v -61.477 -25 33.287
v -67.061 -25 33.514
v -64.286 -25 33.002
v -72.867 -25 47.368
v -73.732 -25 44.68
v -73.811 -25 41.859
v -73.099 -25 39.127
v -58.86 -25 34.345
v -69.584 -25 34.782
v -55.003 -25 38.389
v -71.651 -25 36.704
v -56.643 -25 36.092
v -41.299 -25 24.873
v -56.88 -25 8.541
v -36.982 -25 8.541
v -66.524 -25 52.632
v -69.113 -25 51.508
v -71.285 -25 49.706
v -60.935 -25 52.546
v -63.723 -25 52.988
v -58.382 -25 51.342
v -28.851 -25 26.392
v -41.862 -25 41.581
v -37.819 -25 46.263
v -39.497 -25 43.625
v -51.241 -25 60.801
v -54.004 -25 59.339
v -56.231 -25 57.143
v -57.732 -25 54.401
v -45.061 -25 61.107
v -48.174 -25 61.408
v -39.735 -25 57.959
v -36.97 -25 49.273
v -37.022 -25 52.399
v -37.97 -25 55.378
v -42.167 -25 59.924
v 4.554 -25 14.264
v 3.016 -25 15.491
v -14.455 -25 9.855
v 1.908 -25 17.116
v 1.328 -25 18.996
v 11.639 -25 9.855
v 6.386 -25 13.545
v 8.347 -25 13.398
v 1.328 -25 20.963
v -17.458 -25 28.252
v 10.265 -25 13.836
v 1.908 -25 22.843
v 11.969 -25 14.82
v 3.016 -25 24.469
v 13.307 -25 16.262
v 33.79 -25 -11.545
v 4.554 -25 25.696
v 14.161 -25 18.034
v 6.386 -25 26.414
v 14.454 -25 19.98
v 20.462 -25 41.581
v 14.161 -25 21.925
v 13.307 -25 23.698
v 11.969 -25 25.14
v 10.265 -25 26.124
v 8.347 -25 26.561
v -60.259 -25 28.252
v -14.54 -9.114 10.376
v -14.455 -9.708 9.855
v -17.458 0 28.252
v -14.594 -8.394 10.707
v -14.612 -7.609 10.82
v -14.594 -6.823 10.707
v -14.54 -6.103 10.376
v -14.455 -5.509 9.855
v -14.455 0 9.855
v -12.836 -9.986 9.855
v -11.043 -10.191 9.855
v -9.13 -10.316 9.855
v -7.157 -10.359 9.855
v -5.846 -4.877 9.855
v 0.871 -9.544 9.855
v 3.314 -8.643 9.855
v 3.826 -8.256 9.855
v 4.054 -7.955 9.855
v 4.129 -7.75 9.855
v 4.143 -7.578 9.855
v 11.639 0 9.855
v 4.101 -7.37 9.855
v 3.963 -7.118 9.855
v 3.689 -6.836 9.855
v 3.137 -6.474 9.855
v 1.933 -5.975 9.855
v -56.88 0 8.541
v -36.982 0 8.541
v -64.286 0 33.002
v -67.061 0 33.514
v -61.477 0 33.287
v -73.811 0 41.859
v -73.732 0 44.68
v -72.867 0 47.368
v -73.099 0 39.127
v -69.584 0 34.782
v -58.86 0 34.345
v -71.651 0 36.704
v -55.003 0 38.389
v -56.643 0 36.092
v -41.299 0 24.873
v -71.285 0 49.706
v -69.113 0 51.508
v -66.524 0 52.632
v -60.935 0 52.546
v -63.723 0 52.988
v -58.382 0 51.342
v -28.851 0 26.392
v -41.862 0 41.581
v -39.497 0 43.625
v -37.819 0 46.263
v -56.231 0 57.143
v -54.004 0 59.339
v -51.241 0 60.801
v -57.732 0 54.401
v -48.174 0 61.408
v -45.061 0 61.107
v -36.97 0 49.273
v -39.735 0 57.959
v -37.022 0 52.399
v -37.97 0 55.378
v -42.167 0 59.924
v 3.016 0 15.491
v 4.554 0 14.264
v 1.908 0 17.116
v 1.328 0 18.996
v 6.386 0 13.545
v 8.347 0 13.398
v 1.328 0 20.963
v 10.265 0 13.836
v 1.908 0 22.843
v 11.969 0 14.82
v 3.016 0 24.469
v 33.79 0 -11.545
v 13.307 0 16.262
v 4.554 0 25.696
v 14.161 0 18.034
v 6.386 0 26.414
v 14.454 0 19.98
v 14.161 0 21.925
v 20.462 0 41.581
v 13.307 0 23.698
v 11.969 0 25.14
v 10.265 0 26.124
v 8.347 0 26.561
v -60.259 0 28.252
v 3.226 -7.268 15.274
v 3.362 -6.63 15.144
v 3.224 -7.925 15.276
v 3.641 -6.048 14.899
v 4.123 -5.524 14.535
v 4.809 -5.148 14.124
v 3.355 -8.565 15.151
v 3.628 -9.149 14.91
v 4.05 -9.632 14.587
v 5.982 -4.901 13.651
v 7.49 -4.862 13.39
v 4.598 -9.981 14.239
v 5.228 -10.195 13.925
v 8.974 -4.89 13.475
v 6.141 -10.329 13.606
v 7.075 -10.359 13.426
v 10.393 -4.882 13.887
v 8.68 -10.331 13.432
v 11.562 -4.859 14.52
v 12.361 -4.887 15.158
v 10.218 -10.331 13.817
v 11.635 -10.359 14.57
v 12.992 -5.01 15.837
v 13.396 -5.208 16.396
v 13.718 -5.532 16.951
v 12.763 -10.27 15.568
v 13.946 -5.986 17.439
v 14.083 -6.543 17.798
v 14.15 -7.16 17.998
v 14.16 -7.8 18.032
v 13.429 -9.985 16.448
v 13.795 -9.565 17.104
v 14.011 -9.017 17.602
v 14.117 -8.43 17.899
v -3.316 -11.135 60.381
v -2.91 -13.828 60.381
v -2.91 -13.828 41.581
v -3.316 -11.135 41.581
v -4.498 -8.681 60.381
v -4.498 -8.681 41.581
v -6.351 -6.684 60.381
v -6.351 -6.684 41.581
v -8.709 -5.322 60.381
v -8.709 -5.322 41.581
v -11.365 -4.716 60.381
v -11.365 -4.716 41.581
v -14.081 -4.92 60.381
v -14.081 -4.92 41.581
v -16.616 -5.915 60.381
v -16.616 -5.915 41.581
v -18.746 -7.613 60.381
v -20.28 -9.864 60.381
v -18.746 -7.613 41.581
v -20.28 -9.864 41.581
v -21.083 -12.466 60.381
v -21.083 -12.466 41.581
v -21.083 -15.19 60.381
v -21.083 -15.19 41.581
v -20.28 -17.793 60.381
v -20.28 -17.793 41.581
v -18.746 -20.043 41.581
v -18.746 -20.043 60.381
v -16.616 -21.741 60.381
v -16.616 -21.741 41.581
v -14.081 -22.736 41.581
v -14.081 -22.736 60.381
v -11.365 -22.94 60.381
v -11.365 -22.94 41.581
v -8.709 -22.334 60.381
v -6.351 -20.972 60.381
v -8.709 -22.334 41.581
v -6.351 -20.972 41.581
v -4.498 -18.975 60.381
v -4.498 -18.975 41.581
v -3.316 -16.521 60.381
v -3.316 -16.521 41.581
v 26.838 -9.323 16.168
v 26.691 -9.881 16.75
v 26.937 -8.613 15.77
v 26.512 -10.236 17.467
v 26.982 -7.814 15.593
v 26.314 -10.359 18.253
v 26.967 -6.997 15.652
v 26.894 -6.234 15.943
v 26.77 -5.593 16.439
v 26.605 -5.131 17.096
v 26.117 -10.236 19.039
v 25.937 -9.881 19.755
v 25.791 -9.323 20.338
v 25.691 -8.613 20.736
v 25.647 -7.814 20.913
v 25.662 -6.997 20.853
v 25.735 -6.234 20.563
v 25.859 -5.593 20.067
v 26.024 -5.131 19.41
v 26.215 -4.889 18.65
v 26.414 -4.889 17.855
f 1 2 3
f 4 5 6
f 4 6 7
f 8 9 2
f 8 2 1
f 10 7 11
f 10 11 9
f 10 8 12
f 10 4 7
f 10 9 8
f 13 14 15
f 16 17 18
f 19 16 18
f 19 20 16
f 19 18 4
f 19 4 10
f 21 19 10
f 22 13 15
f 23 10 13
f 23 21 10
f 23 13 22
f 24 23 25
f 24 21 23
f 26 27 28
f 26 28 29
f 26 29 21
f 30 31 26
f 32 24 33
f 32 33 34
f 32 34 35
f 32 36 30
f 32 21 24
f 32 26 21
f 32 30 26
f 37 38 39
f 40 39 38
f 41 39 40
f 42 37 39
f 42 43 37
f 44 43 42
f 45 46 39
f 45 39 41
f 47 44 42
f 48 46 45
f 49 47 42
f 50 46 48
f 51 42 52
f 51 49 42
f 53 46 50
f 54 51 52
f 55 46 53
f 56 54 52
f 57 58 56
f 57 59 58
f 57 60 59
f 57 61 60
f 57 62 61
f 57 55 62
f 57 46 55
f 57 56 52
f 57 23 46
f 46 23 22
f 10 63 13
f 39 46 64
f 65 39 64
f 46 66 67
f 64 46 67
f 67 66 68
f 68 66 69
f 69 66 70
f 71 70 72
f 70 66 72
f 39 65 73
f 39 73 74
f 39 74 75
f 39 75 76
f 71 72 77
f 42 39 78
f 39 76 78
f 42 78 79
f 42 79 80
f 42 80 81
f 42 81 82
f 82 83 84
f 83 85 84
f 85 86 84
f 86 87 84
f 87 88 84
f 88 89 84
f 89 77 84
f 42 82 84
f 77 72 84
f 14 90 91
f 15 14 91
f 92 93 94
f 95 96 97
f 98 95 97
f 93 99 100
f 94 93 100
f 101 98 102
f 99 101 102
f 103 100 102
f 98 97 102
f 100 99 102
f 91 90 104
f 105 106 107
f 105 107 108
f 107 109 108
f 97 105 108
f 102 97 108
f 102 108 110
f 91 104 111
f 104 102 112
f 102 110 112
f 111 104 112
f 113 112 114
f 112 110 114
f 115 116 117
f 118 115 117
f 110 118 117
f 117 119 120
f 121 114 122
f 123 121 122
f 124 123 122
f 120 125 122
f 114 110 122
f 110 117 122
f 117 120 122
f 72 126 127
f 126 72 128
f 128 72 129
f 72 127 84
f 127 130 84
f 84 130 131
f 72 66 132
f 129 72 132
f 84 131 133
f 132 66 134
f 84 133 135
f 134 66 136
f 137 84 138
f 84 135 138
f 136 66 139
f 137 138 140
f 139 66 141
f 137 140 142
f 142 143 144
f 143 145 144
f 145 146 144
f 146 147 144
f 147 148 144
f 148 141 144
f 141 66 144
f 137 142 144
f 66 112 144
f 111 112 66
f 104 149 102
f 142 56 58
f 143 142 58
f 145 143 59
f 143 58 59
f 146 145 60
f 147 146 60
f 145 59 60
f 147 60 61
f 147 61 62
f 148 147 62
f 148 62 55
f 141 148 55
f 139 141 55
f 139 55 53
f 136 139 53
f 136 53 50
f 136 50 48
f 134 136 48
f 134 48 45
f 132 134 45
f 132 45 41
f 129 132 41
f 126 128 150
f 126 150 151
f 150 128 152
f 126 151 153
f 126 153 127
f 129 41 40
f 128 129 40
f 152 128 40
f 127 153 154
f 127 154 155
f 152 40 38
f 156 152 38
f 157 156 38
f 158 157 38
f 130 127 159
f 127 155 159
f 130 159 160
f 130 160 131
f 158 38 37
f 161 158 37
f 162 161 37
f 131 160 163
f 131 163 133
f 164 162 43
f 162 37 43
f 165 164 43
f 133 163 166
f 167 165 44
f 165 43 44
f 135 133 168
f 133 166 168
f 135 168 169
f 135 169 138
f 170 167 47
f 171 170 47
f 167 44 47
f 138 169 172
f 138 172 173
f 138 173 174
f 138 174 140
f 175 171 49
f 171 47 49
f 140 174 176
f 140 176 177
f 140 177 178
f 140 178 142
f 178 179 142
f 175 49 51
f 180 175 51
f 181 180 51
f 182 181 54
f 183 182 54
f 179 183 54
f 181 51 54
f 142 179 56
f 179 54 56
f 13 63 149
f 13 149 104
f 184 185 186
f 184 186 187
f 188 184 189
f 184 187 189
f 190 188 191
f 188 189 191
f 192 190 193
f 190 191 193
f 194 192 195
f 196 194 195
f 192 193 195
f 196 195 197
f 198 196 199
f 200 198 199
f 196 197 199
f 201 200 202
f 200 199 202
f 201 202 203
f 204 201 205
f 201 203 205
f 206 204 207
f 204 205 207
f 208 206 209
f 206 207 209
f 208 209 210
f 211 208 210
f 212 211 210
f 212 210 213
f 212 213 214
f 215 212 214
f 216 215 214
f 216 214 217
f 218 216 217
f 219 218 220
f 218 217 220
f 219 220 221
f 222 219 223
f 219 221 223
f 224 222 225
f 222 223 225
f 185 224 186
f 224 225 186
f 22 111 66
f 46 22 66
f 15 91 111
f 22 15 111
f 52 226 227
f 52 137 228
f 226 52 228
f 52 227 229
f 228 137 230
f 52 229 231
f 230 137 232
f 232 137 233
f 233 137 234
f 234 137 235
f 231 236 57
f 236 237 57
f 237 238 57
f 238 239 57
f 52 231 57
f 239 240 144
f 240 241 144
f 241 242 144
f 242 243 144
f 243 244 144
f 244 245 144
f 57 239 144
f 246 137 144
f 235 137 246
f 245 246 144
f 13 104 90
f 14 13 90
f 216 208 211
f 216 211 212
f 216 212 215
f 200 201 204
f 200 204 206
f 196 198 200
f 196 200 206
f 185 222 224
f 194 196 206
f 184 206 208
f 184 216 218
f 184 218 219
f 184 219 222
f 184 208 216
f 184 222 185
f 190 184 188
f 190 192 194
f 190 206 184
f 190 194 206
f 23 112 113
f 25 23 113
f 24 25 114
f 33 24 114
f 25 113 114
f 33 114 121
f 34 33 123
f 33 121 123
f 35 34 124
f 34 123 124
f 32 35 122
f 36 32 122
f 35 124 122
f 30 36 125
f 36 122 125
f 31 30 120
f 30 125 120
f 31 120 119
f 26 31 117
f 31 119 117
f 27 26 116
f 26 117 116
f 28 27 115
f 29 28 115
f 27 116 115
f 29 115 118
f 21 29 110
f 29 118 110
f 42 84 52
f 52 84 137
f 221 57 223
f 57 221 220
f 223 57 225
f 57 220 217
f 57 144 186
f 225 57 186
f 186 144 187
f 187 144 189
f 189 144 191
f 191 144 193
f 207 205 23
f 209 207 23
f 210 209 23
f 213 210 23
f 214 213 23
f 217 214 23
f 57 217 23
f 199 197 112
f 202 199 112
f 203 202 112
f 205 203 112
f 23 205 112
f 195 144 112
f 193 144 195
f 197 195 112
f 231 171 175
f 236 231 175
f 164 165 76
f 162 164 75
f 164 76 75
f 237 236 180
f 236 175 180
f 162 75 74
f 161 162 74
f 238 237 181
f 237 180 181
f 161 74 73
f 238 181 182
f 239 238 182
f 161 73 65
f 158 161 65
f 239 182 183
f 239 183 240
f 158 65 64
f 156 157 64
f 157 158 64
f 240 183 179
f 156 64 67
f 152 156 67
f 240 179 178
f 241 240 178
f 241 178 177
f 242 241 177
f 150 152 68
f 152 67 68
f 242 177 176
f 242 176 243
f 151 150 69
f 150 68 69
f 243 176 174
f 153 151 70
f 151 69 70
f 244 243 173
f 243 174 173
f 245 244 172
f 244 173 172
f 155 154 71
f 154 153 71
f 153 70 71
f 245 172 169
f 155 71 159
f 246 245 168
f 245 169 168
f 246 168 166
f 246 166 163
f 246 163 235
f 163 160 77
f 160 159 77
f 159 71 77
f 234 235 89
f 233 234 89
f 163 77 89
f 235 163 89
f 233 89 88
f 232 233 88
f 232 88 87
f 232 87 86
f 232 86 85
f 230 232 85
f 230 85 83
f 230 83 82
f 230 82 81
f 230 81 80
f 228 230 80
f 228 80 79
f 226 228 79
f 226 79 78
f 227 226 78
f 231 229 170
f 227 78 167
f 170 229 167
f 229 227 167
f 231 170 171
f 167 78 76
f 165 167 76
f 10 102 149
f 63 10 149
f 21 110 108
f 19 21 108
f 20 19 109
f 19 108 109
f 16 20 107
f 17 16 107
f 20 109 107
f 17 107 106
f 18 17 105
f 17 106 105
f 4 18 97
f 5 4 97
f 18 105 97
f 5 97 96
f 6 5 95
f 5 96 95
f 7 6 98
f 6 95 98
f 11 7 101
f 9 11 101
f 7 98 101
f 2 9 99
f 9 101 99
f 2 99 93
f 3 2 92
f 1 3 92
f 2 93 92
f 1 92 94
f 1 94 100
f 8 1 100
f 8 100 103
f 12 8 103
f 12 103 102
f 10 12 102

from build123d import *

# Parameters (mm, degrees)
F1_DEPTH = 25
F2_R     = 9.1373758173
F3_DEPTH = 18.8
F6_D     = 5.5
F9_D     = 13.2


with BuildPart() as f1:
    # F0 (on Front) → F1 (new body)
    with BuildSketch(Plane.XZ):
        with BuildLine():
            Line((20.4618610442, 41.5807515383), (-41.8623387814, 41.5807515383))
            ThreePointArc((-41.8623387814, 41.5807515383), (-42.1671038517, 59.9239812985), (-58.3820044994, 51.3423755765))
            ThreePointArc((-58.3820044994, 51.3423755765), (-73.5517436915, 40.4678527546), (-55.0029836595, 38.3894555271))
            Line((-55.0029836595, 38.3894555271), (-60.2592416108, 28.2523836941))
            Line((-60.2592416108, 28.2523836941), (-41.2991680205, 24.8733609915))
            Line((-41.2991680205, 24.8733609915), (-56.8802170455, 8.5414182395))
            Line((-56.8802170455, 8.5414182395), (-36.9815267622, 8.5414182395))
            Line((-36.9815267622, 8.5414182395), (-28.8509290056, 26.3923599584))
            Line((-28.8509290056, 26.3923599584), (-17.4582842737, 28.2523836941))
            Line((-17.4582842737, 28.2523836941), (-14.4547084346, 9.8554827273))
            Line((-14.4547084346, 9.8554827273), (11.6388564929, 9.8554827273))
            Line((11.6388564929, 9.8554827273), (33.7902270257, -11.5449940786))
            Line((33.7902270257, -11.5449940786), (20.4618610442, 41.5807515383))
        make_face()
    extrude(amount=F1_DEPTH)

    # F2 (on face) → F3 (join)
    with BuildSketch(Plane.XY.offset(41.5807515383)):
        with Locations((-12.0476996526, -13.8280903921)):
            Circle(F2_R)
    extrude(amount=F3_DEPTH)

    # F6 (through all)
    with Locations(Plane(origin=(29.0643953622, 0, 7.2917733939), x_dir=(0, 1, 0), z_dir=(0.9699405616, 0, 0.2433419547))):
        with Locations((-7.6085178865, 11.3008453181)):
            Hole(F6_D / 2)

    # F9 (through all)
    with Locations(Plane(origin=(0, 0, 0), x_dir=(-1, 0, 0), z_dir=(0, 1, 0))):
        with Locations((-7.8541710973, 19.9797544628)):
            Hole(F9_D / 2)


solid = f1.part
